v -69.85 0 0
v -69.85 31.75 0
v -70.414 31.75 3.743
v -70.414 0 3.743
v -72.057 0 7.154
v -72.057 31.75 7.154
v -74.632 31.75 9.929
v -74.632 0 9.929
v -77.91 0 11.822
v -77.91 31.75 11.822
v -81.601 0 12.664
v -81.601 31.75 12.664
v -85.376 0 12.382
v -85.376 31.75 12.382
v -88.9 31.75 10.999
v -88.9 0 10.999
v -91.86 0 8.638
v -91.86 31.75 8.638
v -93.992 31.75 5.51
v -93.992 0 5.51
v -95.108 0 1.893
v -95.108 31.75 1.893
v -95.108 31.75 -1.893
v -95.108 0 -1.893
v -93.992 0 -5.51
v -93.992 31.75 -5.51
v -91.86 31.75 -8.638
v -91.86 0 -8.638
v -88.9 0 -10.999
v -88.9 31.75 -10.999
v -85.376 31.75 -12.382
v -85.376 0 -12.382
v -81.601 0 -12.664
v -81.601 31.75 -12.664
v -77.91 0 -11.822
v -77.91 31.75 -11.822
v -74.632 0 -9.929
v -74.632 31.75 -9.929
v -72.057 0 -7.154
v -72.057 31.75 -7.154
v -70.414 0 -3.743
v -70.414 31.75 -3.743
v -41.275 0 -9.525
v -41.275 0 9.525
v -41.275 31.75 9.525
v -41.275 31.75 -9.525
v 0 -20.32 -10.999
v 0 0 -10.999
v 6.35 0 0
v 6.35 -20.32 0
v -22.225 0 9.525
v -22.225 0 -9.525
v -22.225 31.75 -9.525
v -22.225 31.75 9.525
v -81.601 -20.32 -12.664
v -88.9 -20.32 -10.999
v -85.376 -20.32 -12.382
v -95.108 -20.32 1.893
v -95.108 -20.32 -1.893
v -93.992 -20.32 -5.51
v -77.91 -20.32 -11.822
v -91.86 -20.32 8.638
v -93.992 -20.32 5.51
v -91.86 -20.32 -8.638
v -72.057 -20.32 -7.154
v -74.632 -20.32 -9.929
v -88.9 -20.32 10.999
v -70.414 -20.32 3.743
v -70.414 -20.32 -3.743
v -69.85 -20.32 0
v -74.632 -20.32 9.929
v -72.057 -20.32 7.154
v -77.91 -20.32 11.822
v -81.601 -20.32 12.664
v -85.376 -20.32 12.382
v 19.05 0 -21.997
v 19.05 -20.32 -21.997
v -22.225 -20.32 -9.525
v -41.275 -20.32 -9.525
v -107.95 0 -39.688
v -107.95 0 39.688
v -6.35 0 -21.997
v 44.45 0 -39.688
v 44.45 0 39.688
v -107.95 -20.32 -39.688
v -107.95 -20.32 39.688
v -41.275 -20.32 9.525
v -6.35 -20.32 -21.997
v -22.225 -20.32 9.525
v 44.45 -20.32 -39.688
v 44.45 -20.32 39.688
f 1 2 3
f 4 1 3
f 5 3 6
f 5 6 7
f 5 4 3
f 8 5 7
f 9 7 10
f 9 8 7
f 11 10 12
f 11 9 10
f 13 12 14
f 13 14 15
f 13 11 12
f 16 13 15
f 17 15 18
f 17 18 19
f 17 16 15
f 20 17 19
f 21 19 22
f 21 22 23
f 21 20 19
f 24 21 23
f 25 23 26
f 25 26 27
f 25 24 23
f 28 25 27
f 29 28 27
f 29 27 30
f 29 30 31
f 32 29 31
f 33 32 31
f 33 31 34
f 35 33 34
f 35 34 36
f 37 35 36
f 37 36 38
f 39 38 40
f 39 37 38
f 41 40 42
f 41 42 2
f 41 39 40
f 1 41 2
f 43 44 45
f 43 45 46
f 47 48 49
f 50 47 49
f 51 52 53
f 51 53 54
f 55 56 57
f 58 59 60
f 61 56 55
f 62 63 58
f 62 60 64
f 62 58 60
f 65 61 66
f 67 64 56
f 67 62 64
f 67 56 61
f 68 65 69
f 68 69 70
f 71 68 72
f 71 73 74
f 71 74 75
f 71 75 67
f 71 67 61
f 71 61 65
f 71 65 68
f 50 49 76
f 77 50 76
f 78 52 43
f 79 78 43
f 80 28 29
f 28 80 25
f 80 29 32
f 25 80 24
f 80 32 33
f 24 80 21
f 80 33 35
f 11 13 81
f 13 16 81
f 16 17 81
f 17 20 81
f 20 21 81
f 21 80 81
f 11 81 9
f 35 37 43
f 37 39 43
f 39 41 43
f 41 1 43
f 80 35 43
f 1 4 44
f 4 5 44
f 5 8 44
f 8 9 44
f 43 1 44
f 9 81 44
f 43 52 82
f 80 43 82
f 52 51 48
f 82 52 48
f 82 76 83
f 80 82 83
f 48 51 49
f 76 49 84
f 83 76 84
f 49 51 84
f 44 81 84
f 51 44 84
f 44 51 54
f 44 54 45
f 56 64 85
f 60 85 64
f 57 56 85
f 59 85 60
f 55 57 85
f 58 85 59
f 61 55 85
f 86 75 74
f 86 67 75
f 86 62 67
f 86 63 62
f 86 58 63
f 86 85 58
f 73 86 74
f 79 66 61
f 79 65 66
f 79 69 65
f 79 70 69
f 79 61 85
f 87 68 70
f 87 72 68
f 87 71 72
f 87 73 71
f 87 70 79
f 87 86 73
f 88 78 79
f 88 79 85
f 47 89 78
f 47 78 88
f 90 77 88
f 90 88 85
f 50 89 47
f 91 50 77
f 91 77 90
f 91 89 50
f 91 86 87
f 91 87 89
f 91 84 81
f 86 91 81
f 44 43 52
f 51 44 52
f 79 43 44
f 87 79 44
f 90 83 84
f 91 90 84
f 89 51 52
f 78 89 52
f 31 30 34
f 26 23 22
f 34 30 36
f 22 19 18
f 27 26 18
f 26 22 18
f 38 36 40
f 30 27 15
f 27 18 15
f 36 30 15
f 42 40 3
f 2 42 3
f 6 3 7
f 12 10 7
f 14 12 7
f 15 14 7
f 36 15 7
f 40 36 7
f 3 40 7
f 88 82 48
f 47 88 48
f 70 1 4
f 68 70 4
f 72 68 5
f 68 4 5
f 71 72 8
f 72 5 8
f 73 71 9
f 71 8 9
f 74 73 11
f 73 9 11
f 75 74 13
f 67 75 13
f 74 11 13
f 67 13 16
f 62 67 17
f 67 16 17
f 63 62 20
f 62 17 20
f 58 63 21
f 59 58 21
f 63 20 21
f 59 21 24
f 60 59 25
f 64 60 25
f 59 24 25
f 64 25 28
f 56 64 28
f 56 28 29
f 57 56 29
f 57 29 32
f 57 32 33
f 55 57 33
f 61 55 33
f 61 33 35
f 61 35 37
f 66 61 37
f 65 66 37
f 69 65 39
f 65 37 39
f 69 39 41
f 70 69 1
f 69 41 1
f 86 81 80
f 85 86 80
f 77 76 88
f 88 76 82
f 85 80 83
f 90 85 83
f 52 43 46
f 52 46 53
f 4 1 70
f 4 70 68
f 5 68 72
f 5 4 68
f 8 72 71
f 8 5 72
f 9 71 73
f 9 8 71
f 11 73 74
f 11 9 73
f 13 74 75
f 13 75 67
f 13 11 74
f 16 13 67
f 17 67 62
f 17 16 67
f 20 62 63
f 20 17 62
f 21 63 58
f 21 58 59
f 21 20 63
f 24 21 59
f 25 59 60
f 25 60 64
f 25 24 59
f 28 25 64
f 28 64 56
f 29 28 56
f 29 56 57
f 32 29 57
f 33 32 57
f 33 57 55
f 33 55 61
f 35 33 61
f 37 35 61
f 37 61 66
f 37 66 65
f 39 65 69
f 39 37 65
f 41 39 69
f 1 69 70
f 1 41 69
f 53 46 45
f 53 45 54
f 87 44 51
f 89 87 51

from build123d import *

# Parameters (mm, degrees)
F0_R          = 12.7
F1_DEPTH      = 20.32
F2_DEPTH      = 31.75
F2_DEPTH_BACK = 20.32
F3_DEPTH      = 31.75


with BuildPart() as f1:
    # F0 (on Front) → F1 (new body)
    with BuildSketch(Plane.XZ):
        Polygon((-107.95, -39.6875), (0, -39.6875), (44.45, -39.6875), (44.45, 39.6875), (-107.95, 39.6875), align=None)
        Polygon((0, -10.9985226281), (0, 0), (6.35, 0), (19.05, -21.9970452561), (0, -21.9970452561), (-6.35, -21.9970452561), align=None, mode=Mode.SUBTRACT)
        with Locations((-82.55, 0)):
            Circle(F0_R, mode=Mode.SUBTRACT)
        Polygon((-22.225, 9.525), (-22.225, 0), (-22.225, -9.525), (-41.275, -9.525), (-41.275, 0), (-41.275, 9.525), align=None, mode=Mode.SUBTRACT)
        Polygon((6.35, 0), (0, 0), (0, -10.9985226281), align=None)
    extrude(amount=F1_DEPTH)


with BuildPart() as f2:
    # F0 (on Front) → F2 (new body, two sides)
    with BuildSketch(Plane.XZ) as f2_sk:
        with Locations((-82.55, 0)):
            Circle(F0_R)
    extrude(amount=-F2_DEPTH)
    extrude(f2_sk.sketch, amount=F2_DEPTH_BACK)


with BuildPart() as f3:
    # F0 (on Front) → F3 (new body)
    with BuildSketch(Plane.XZ):
        Polygon((-22.225, -9.525), (-22.225, 0), (-31.75, 0), (-41.275, 0), (-41.275, -9.525), align=None)
        Polygon((-31.75, 0), (-22.225, 0), (-22.225, 9.525), (-41.275, 9.525), (-41.275, 0), align=None)
    extrude(amount=-F3_DEPTH)


solid = Compound([f1.part, f2.part, f3.part])
